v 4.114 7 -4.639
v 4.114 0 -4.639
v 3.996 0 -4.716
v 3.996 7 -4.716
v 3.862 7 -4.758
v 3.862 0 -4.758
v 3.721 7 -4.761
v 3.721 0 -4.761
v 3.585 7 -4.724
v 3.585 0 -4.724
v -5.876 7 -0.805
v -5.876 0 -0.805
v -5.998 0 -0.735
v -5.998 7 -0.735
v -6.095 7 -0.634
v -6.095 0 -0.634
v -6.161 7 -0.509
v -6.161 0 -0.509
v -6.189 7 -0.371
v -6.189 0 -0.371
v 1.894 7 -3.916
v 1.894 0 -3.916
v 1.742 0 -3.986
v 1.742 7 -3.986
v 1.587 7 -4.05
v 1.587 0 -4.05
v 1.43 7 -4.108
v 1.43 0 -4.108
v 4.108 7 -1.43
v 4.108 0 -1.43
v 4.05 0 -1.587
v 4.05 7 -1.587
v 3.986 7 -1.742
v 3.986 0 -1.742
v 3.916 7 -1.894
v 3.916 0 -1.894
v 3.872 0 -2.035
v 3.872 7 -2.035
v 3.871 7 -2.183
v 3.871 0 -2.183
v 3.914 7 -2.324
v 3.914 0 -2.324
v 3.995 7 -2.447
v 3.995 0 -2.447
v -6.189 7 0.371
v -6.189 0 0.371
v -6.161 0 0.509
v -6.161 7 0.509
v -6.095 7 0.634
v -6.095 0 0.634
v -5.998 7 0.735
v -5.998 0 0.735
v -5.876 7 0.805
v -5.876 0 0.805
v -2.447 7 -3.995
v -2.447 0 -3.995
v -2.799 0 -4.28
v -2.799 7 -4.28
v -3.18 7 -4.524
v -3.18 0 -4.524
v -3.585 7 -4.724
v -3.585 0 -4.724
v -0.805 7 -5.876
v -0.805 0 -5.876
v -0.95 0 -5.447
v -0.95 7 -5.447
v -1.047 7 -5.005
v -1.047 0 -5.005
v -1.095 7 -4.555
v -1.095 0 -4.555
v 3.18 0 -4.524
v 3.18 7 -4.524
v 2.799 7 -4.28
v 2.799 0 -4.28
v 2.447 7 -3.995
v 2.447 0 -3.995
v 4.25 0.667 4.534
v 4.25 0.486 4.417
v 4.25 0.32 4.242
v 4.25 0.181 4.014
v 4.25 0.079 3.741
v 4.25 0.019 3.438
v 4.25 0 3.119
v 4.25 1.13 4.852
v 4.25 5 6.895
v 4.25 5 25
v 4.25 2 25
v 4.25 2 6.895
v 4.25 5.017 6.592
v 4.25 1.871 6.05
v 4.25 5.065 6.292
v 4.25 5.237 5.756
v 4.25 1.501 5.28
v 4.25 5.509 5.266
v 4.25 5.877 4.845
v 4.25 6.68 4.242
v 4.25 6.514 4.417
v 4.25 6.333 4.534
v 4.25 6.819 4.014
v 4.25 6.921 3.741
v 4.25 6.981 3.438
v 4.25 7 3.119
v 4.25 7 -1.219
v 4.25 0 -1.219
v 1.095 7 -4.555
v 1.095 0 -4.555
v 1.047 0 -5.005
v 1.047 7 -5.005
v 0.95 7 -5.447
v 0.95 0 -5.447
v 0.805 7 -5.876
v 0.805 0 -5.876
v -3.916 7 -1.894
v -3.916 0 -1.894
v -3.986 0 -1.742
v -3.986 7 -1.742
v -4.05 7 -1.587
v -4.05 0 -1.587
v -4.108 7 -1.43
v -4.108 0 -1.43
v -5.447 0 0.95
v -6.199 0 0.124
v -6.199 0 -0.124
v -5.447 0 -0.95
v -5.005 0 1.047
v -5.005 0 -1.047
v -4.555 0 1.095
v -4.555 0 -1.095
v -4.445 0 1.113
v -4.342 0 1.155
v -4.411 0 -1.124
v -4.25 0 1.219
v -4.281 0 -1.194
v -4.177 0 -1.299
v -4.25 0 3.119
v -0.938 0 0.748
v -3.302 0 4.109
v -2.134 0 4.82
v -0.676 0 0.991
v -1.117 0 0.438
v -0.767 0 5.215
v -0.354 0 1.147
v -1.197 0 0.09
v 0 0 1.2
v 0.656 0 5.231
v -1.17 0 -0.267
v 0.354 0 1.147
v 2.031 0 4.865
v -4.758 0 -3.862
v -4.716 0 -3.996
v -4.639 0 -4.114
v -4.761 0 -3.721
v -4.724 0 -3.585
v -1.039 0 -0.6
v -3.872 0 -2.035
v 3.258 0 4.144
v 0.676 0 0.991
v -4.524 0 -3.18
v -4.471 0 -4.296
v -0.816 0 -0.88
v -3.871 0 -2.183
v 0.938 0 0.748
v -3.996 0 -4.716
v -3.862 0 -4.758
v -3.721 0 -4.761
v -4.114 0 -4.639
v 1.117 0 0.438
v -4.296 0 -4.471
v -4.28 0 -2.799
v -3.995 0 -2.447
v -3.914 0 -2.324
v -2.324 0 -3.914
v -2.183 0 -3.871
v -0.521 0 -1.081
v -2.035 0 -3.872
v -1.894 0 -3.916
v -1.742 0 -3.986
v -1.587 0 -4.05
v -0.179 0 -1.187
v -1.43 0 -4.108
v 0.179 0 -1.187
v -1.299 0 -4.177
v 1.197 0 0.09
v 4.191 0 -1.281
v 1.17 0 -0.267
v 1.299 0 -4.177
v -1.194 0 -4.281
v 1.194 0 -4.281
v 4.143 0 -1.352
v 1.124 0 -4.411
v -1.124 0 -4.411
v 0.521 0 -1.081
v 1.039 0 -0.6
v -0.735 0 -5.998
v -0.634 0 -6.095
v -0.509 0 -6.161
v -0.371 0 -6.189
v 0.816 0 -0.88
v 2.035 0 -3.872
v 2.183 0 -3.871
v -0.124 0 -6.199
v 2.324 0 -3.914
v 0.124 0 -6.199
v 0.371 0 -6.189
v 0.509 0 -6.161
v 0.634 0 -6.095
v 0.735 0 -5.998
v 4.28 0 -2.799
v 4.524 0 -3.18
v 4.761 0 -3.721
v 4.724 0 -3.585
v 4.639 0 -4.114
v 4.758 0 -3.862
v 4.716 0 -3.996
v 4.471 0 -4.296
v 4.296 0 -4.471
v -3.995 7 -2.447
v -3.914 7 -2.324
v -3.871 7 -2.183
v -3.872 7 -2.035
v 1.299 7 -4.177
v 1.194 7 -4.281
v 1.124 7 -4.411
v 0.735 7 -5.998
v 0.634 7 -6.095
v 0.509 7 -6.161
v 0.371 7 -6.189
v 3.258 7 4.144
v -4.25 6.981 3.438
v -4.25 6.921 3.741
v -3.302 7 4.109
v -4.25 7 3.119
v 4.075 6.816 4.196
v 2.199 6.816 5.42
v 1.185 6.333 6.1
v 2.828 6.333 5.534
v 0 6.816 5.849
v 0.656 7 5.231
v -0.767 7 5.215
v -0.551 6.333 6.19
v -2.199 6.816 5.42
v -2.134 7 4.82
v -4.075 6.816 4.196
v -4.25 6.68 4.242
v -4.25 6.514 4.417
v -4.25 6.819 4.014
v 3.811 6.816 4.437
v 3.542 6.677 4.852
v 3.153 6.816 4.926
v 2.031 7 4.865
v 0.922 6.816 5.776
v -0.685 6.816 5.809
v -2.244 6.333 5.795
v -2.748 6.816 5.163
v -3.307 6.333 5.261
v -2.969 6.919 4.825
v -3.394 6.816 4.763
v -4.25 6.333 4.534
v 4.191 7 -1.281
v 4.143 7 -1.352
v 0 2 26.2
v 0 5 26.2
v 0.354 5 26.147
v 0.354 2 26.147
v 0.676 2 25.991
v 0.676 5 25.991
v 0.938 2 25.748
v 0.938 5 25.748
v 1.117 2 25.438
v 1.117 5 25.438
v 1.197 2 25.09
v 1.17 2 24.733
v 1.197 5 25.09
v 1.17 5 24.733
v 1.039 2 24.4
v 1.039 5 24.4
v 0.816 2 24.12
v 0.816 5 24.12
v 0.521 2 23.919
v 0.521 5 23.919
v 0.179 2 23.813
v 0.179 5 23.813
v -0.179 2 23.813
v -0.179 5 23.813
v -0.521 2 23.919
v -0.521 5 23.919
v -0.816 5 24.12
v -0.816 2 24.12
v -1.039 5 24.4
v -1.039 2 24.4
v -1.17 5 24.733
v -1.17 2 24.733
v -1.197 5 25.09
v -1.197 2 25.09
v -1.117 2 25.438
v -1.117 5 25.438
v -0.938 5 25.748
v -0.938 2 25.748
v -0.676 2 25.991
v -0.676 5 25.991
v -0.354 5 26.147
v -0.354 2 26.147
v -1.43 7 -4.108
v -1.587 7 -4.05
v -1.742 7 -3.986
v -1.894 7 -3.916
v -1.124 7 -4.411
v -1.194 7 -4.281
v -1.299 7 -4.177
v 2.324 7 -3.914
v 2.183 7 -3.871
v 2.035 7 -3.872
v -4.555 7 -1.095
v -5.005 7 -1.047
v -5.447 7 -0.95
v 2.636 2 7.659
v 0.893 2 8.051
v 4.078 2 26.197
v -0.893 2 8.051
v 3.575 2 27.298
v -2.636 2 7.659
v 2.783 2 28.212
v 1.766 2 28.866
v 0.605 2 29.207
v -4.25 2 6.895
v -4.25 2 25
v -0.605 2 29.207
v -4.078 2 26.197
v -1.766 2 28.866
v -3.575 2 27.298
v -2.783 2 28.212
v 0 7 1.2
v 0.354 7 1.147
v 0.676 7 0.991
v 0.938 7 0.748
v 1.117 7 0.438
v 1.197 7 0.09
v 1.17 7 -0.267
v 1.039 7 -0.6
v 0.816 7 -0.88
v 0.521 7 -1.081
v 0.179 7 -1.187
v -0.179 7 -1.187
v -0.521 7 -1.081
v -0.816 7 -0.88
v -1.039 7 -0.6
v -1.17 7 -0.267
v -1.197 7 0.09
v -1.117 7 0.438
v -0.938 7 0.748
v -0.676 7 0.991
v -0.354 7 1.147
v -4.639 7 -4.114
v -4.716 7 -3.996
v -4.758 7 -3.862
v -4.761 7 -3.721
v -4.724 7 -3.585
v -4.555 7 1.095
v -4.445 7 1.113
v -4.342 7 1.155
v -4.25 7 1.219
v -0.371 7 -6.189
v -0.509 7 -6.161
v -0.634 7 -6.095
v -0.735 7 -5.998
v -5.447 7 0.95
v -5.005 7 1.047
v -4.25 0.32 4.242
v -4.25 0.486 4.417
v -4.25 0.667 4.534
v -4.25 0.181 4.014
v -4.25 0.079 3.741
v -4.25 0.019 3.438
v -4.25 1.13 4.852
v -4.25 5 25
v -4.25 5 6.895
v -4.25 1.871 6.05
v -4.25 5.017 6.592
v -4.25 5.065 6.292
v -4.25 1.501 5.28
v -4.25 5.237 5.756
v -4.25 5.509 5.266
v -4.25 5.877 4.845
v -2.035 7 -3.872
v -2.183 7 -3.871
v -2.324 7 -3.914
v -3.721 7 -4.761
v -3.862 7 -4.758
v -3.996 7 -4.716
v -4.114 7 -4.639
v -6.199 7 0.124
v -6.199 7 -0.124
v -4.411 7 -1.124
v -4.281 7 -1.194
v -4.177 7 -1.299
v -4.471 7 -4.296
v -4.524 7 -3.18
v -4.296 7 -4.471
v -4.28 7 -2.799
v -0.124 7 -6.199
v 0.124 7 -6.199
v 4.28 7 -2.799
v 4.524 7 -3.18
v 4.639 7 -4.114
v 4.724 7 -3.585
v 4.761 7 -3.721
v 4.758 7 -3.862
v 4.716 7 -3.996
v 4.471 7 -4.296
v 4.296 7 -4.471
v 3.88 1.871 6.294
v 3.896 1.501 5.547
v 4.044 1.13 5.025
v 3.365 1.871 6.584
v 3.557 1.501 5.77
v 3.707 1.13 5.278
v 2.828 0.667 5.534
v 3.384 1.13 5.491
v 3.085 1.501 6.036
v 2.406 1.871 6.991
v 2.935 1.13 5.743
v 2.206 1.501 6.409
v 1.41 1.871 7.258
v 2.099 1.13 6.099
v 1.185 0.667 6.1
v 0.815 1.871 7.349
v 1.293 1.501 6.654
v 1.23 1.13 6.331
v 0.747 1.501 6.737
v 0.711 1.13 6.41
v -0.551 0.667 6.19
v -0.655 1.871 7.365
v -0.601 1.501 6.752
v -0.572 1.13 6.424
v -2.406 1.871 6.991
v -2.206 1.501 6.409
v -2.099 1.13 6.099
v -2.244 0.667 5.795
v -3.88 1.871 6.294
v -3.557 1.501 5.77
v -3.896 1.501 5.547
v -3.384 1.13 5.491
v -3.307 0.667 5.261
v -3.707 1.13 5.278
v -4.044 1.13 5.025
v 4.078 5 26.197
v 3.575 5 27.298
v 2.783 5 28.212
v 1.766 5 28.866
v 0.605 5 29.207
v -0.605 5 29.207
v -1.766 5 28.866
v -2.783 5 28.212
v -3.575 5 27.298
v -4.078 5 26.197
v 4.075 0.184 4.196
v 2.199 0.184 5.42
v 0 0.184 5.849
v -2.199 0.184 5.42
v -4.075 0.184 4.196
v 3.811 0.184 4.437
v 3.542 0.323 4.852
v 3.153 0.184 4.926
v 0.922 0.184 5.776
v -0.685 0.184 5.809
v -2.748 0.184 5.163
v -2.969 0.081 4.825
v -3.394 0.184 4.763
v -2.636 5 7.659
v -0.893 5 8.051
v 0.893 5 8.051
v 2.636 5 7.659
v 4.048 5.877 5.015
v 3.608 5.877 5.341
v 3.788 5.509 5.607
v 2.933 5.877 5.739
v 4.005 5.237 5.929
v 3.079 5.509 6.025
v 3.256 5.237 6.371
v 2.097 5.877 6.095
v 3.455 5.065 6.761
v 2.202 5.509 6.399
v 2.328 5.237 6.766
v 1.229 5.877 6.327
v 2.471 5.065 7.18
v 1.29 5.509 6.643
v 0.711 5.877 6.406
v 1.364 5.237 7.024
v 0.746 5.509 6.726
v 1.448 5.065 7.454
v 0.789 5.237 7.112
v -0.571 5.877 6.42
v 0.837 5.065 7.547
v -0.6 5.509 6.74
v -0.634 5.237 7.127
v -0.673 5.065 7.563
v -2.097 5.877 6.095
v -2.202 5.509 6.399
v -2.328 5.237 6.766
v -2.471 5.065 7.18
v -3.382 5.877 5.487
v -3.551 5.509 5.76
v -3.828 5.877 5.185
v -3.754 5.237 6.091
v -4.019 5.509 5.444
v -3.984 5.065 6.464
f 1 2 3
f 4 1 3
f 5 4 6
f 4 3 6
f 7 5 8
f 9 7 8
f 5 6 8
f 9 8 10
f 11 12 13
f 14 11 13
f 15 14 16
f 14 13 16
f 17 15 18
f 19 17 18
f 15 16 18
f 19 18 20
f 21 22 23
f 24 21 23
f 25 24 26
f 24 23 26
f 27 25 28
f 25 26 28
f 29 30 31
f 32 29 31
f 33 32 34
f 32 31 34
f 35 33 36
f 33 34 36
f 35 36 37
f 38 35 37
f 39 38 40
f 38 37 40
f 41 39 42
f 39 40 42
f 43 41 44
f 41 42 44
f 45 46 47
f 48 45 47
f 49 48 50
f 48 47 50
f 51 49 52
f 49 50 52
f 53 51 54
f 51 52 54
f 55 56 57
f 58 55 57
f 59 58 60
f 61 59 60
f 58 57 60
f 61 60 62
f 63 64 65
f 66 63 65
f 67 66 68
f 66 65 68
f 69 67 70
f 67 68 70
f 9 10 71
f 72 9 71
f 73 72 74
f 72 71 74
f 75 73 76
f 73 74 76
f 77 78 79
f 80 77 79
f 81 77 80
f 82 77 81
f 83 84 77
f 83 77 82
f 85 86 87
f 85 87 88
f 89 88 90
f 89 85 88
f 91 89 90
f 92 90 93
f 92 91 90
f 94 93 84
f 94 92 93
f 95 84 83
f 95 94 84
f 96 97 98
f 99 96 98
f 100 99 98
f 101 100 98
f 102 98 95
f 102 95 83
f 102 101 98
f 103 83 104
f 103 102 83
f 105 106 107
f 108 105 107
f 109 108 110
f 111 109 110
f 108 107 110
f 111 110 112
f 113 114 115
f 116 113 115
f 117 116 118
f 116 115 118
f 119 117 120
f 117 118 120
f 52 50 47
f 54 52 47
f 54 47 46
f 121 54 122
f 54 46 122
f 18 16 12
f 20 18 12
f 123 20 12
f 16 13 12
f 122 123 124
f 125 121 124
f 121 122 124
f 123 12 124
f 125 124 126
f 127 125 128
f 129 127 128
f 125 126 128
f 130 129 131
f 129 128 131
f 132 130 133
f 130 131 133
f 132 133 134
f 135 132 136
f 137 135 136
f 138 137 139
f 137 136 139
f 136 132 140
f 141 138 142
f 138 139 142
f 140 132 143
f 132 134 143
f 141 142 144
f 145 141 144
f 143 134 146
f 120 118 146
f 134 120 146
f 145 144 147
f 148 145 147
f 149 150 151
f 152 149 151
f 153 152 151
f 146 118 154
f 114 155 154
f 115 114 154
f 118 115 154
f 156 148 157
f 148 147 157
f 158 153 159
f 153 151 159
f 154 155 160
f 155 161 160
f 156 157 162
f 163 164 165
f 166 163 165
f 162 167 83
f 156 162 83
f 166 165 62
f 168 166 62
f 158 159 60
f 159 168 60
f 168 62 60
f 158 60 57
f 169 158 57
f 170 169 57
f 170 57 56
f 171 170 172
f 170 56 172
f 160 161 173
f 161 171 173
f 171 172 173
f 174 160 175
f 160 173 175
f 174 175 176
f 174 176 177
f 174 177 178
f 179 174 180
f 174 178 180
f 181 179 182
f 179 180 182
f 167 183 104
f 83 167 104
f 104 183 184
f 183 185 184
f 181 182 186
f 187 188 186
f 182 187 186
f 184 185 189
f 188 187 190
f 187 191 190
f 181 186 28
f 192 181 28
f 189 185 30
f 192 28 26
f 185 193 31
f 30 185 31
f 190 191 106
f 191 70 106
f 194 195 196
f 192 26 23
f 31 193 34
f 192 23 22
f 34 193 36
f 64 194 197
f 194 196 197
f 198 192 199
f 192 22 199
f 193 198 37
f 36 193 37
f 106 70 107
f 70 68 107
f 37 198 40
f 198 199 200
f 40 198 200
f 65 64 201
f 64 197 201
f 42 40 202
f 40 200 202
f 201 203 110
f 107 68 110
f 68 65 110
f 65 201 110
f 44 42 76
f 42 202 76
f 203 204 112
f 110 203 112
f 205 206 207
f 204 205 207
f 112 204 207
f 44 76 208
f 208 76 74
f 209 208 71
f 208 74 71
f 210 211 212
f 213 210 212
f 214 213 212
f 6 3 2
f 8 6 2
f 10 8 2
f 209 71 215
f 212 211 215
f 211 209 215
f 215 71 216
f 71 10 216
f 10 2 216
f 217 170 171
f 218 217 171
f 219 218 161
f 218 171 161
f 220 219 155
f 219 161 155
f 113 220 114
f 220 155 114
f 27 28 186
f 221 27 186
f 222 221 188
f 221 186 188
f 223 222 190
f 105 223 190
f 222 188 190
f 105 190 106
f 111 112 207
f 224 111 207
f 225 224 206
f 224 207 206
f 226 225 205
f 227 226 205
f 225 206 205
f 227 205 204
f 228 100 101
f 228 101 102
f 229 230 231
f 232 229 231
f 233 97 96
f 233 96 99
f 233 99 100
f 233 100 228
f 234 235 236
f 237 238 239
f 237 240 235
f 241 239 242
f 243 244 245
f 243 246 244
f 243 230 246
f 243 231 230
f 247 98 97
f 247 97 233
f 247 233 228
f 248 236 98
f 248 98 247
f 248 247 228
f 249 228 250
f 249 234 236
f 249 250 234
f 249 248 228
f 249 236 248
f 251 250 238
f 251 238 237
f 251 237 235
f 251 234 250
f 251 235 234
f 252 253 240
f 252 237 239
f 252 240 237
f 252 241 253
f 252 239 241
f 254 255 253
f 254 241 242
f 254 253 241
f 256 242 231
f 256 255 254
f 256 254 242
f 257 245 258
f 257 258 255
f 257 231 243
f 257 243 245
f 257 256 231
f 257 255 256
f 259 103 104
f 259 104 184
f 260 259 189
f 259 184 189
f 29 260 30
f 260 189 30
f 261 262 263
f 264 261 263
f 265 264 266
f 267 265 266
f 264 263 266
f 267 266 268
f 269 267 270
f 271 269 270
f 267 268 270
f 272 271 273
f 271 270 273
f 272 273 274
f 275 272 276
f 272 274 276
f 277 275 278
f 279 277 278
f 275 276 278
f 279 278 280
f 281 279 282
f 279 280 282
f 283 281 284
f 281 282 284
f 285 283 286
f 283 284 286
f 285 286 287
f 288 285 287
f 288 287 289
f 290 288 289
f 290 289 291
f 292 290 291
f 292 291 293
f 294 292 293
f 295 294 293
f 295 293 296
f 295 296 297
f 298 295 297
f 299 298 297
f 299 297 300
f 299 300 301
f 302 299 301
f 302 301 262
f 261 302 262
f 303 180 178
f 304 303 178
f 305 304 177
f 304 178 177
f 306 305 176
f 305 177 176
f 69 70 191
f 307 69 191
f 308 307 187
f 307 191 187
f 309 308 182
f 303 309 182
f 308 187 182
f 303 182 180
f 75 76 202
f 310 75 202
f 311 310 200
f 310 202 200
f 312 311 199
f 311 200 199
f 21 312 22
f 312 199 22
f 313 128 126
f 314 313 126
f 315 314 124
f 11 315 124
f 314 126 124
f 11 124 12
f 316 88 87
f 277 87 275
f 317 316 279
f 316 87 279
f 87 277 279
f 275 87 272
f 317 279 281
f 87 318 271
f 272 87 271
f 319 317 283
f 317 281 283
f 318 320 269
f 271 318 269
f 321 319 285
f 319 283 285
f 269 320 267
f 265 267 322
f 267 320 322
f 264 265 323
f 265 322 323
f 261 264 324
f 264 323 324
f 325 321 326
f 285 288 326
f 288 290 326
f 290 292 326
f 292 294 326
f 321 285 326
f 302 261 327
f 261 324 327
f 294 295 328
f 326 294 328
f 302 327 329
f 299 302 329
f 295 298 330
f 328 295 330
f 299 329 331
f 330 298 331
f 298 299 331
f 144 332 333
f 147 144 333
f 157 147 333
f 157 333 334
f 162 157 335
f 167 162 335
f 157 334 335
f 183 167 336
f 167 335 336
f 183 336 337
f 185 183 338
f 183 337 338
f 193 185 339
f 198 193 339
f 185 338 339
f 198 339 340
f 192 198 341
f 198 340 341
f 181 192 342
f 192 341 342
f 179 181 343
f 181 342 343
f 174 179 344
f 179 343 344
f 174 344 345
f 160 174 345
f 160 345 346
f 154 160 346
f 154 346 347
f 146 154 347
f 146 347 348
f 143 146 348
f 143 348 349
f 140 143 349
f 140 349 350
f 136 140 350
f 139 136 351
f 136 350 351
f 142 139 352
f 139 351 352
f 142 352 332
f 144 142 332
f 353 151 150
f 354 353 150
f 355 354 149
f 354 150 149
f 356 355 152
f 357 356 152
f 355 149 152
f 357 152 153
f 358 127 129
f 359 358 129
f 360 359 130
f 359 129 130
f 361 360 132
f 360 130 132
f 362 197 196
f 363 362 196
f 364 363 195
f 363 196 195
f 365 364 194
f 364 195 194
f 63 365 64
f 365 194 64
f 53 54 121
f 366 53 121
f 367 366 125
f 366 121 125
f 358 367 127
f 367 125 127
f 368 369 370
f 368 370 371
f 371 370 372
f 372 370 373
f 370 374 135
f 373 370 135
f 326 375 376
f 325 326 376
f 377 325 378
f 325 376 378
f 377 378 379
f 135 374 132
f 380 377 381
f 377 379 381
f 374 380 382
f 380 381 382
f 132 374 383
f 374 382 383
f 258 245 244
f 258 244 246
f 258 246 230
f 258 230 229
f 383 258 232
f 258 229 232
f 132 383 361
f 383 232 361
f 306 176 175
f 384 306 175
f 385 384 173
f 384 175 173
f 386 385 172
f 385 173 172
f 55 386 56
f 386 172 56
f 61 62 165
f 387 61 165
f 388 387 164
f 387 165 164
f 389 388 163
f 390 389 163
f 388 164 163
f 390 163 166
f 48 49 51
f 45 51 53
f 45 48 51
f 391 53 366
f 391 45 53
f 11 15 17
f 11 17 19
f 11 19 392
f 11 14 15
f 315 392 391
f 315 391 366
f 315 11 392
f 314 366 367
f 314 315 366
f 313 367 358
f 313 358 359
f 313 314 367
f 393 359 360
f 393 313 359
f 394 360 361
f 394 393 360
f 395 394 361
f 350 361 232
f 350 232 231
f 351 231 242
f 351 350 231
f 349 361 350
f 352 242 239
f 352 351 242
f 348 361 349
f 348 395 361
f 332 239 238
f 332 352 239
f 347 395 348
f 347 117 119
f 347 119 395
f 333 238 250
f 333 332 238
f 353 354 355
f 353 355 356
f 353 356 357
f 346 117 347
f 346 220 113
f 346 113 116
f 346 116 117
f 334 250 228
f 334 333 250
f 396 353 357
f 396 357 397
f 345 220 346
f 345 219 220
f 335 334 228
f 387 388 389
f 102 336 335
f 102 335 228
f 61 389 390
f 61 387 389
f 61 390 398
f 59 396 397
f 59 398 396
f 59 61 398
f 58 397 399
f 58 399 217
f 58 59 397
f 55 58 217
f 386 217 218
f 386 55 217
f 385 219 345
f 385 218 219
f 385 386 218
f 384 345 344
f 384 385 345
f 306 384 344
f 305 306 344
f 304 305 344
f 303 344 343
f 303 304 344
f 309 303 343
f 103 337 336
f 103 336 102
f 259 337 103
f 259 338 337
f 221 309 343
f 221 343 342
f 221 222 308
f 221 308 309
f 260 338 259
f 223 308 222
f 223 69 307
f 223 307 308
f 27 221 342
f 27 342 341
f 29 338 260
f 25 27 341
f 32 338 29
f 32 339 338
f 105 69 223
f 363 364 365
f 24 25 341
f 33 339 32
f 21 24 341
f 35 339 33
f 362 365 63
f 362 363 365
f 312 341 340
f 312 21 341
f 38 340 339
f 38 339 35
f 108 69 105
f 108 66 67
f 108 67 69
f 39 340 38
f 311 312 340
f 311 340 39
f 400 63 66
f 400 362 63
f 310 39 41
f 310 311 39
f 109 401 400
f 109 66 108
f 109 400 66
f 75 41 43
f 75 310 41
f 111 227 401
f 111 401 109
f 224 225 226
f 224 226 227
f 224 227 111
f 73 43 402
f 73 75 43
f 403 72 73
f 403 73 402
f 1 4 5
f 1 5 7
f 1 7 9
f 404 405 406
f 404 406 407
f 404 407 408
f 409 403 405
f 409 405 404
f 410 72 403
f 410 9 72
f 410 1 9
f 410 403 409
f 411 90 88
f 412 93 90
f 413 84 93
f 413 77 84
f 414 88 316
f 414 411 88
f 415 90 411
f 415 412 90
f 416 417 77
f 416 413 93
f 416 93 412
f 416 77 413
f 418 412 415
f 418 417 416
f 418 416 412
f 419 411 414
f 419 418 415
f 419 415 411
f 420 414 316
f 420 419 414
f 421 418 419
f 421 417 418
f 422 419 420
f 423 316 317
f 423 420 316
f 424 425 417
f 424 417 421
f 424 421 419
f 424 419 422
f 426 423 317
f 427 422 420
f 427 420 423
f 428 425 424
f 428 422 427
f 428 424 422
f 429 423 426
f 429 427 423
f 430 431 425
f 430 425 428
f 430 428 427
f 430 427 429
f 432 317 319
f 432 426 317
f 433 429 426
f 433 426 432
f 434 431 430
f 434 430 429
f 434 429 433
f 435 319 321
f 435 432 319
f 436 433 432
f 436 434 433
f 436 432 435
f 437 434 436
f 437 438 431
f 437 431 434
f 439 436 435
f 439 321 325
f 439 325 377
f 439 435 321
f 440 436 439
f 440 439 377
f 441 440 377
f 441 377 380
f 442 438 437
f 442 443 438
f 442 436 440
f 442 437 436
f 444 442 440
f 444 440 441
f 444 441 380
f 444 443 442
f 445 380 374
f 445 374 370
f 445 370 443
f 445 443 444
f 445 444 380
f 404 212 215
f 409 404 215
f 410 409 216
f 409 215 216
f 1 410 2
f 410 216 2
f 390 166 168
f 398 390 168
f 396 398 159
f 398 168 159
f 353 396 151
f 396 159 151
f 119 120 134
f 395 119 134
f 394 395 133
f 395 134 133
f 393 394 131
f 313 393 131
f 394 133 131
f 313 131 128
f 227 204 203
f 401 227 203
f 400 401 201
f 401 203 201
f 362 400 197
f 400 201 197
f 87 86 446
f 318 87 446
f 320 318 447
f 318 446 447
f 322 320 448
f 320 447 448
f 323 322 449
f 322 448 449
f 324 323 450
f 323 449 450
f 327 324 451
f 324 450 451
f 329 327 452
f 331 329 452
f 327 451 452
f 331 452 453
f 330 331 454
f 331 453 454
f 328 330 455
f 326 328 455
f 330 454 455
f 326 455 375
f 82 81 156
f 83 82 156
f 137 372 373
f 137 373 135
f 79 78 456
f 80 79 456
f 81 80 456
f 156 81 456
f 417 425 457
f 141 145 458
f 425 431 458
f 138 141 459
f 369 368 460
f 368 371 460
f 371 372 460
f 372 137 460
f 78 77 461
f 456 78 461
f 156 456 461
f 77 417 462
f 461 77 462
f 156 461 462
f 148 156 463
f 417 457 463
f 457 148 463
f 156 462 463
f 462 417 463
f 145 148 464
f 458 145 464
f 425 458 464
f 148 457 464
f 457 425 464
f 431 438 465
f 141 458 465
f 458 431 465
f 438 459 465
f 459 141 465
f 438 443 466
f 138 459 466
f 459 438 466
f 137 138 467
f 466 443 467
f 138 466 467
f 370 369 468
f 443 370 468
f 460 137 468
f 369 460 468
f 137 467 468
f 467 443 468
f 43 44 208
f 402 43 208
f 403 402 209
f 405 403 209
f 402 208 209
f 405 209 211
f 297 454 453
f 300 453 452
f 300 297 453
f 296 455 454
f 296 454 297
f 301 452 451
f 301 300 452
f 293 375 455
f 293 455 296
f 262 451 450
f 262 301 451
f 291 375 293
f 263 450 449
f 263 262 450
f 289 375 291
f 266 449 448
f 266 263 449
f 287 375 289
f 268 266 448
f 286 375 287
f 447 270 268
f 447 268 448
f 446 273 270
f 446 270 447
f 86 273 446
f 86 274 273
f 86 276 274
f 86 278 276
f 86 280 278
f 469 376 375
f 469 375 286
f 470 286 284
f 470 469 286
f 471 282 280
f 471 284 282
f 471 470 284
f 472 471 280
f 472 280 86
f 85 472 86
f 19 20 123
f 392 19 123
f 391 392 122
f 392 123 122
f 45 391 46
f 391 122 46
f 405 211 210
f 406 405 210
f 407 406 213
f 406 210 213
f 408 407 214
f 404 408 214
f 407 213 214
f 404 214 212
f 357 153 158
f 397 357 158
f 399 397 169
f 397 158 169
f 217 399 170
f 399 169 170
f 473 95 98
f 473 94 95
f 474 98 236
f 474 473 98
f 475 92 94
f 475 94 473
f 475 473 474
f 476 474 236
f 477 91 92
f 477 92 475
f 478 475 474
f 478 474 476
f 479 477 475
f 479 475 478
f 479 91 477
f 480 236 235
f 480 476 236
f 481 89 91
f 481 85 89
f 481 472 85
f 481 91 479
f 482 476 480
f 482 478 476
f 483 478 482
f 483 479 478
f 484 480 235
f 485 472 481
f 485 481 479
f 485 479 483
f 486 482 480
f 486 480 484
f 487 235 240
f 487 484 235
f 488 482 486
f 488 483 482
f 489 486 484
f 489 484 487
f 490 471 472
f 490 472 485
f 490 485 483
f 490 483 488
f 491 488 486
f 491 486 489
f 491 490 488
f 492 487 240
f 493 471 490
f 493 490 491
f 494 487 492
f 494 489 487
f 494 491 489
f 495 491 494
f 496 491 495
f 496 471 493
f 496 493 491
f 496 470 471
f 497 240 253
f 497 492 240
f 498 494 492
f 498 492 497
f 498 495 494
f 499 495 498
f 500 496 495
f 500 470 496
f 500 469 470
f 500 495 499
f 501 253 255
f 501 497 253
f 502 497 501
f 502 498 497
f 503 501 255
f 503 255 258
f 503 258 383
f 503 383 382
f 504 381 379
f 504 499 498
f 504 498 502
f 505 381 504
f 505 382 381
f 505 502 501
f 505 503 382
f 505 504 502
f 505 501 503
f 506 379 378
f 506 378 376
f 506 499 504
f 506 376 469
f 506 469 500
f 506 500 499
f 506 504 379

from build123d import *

# Parameters (mm, degrees)
BOSS_EXTRUDE1_DEPTH = 7
BOSS_EXTRUDE2_DEPTH = 7
SKETCH3_R           = 1.2
SKETCH3_W           = 3
SKETCH3_H           = 6
SKETCH3_W_2         = 1
SKETCH3_H_2         = 1.756233336
CUT_EXTRUDE1_DEPTH  = 7
CUT_EXTRUDE2_DEPTH  = 2
CUT_EXTRUDE3_START  = -2
CUT_EXTRUDE3_DEPTH  = 2
FILLET1_R           = 2
FILLET2_R           = 1


with BuildPart() as part:
    # Sketch1 → Boss-Extrude1 (new body)
    with BuildSketch(Plane(origin=(0, 0, 0), x_dir=(1, 0, 0), z_dir=(0, 1, 0))):
        with BuildLine():
            ThreePointArc((-3.91606346, 1.893923699), (-4.018875966, 1.664672931), (-4.108281319, 1.429868737))
            ThreePointArc((-4.108281319, 1.429868737), (-4.280699455, 1.194070126), (-4.55544348, 1.094849567))
            ThreePointArc((-4.55544348, 1.094849567), (-5.227650928, 1.004963027), (-5.875844758, 0.805495733))
            ThreePointArc((-5.875844758, 0.805495733), (-6.095335918, 0.633837197), (-6.188868421, 0.371359211))
            ThreePointArc((-6.188868421, 0.371359211), (-6.2, 0), (-6.188868421, -0.371359211))
            ThreePointArc((-6.188868421, -0.371359211), (-6.095335918, -0.633837197), (-5.875844758, -0.805495733))
            ThreePointArc((-5.875844758, -0.805495733), (-5.227650928, -1.004963027), (-4.55544348, -1.094849567))
            ThreePointArc((-4.55544348, -1.094849567), (-4.280699455, -1.194070126), (-4.108281319, -1.429868737))
            ThreePointArc((-4.108281319, -1.429868737), (-4.018875966, -1.664672931), (-3.91606346, -1.893923699))
            ThreePointArc((-3.91606346, -1.893923699), (-3.871246696, -2.182576529), (-3.995360529, -2.447009422))
            ThreePointArc((-3.995360529, -2.447009422), (-4.407123592, -2.985891249), (-4.724421169, -3.585278179))
            ThreePointArc((-4.724421169, -3.585278179), (-4.758243941, -3.861862781), (-4.638781445, -4.113600212))
            ThreePointArc((-4.638781445, -4.113600212), (-4.274116248, -4.491317212), (-3.87880163, -4.836827257))
            ThreePointArc((-3.87880163, -4.836827257), (-3.119853719, -4.489348414), (-2.447009422, -3.995360529))
            ThreePointArc((-2.447009422, -3.995360529), (-2.182576529, -3.871246696), (-1.893923699, -3.91606346))
            ThreePointArc((-1.893923699, -3.91606346), (-1.664672931, -4.018875966), (-1.429868737, -4.108281319))
            ThreePointArc((-1.429868737, -4.108281319), (-1.194070126, -4.280699455), (-1.094849567, -4.55544348))
            ThreePointArc((-1.094849567, -4.55544348), (-1.004963027, -5.227650928), (-0.805495733, -5.875844758))
            ThreePointArc((-0.805495733, -5.875844758), (-0.633837197, -6.095335918), (-0.371359211, -6.188868421))
            ThreePointArc((-0.371359211, -6.188868421), (0, -6.2), (0.371359211, -6.188868421))
            ThreePointArc((0.371359211, -6.188868421), (0.633837197, -6.095335918), (0.805495733, -5.875844758))
            ThreePointArc((0.805495733, -5.875844758), (1.004963027, -5.227650928), (1.094849567, -4.55544348))
            ThreePointArc((1.094849567, -4.55544348), (1.194070126, -4.280699455), (1.429868737, -4.108281319))
            ThreePointArc((1.429868737, -4.108281319), (1.664672931, -4.018875966), (1.893923699, -3.91606346))
            ThreePointArc((1.893923699, -3.91606346), (2.182576529, -3.871246696), (2.447009422, -3.995360529))
            ThreePointArc((2.447009422, -3.995360529), (2.985891249, -4.407123592), (3.585278179, -4.724421169))
            ThreePointArc((3.585278179, -4.724421169), (3.861862781, -4.758243941), (4.113600212, -4.638781445))
            ThreePointArc((4.113600212, -4.638781445), (4.384062043, -4.384062043), (4.638781445, -4.113600212))
            ThreePointArc((4.638781445, -4.113600212), (4.758243941, -3.861862781), (4.724421169, -3.585278179))
            ThreePointArc((4.724421169, -3.585278179), (4.407123592, -2.985891249), (3.995360529, -2.447009422))
            ThreePointArc((3.995360529, -2.447009422), (3.871246696, -2.182576529), (3.91606346, -1.893923699))
            ThreePointArc((3.91606346, -1.893923699), (4.018875966, -1.664672931), (4.108281319, -1.429868737))
            ThreePointArc((4.108281319, -1.429868737), (4.280699455, -1.194070126), (4.55544348, -1.094849567))
            ThreePointArc((4.55544348, -1.094849567), (5.227650928, -1.004963027), (5.875844758, -0.805495733))
            ThreePointArc((5.875844758, -0.805495733), (6.095335918, -0.633837197), (6.188868421, -0.371359211))
            ThreePointArc((6.188868421, -0.371359211), (6.2, 0), (6.188868421, 0.371359211))
            ThreePointArc((6.188868421, 0.371359211), (6.095335918, 0.633837197), (5.875844758, 0.805495733))
            ThreePointArc((5.875844758, 0.805495733), (5.227650928, 1.004963027), (4.55544348, 1.094849567))
            ThreePointArc((4.55544348, 1.094849567), (4.280699455, 1.194070126), (4.108281319, 1.429868737))
            ThreePointArc((4.108281319, 1.429868737), (4.018875966, 1.664672931), (3.91606346, 1.893923699))
            ThreePointArc((3.91606346, 1.893923699), (3.871246696, 2.182576529), (3.995360529, 2.447009422))
            ThreePointArc((3.995360529, 2.447009422), (4.407123592, 2.985891249), (4.724421169, 3.585278179))
            ThreePointArc((4.724421169, 3.585278179), (4.758243941, 3.861862781), (4.638781445, 4.113600212))
            ThreePointArc((4.638781445, 4.113600212), (4.384062043, 4.384062043), (4.113600212, 4.638781445))
            ThreePointArc((4.113600212, 4.638781445), (3.861862781, 4.758243941), (3.585278179, 4.724421169))
            ThreePointArc((3.585278179, 4.724421169), (2.985891249, 4.407123592), (2.447009422, 3.995360529))
            ThreePointArc((2.447009422, 3.995360529), (2.182576529, 3.871246696), (1.893923699, 3.91606346))
            ThreePointArc((1.893923699, 3.91606346), (1.664672931, 4.018875966), (1.429868737, 4.108281319))
            ThreePointArc((1.429868737, 4.108281319), (1.194070126, 4.280699455), (1.094849567, 4.55544348))
            ThreePointArc((1.094849567, 4.55544348), (1.004963027, 5.227650928), (0.805495733, 5.875844758))
            ThreePointArc((0.805495733, 5.875844758), (0.633837197, 6.095335918), (0.371359211, 6.188868421))
            ThreePointArc((0.371359211, 6.188868421), (0, 6.2), (-0.371359211, 6.188868421))
            ThreePointArc((-0.371359211, 6.188868421), (-0.633837197, 6.095335918), (-0.805495733, 5.875844758))
            ThreePointArc((-0.805495733, 5.875844758), (-1.004963027, 5.227650928), (-1.094849567, 4.55544348))
            ThreePointArc((-1.094849567, 4.55544348), (-1.194070126, 4.280699455), (-1.429868737, 4.108281319))
            ThreePointArc((-1.429868737, 4.108281319), (-1.664672931, 4.018875966), (-1.893923699, 3.91606346))
            ThreePointArc((-1.893923699, 3.91606346), (-2.182576529, 3.871246696), (-2.447009422, 3.995360529))
            ThreePointArc((-2.447009422, 3.995360529), (-2.985891249, 4.407123592), (-3.585278179, 4.724421169))
            ThreePointArc((-3.585278179, 4.724421169), (-3.861862781, 4.758243941), (-4.113600212, 4.638781445))
            ThreePointArc((-4.113600212, 4.638781445), (-4.384062043, 4.384062043), (-4.638781445, 4.113600212))
            ThreePointArc((-4.638781445, 4.113600212), (-4.758243941, 3.861862781), (-4.724421169, 3.585278179))
            ThreePointArc((-4.724421169, 3.585278179), (-4.407123592, 2.985891249), (-3.995360529, 2.447009422))
            ThreePointArc((-3.995360529, 2.447009422), (-3.871246696, 2.182576529), (-3.91606346, 1.893923699))
        make_face()
    extrude(amount=BOSS_EXTRUDE1_DEPTH)

    # Sketch2 → Boss-Extrude2 (add)
    with BuildSketch(Plane(origin=(0, 7, 0), x_dir=(1, 0, 0), z_dir=(0, 1, 0))):
        with BuildLine():
            Line((4.25, 0), (4.25, -25))
            ThreePointArc((4.25, -25), (0, -29.25), (-4.25, -25))
            Line((-4.25, -25), (-4.25, 0))
            ThreePointArc((-4.25, 0), (0, 4.25), (4.25, 0))
        make_face()
    extrude(amount=-BOSS_EXTRUDE2_DEPTH)

    # Sketch3 → Cut-Extrude1 (cut)
    with BuildSketch(Plane(origin=(0, 7, 0), x_dir=(1, 0, 0), z_dir=(0, 1, 0))):
        with Locations(Location((0, 0, 0), (0, 0, 270))):
            Circle(SKETCH3_R)
        with Locations(Location((0, -25, 0), (0, 0, 270))):
            Circle(SKETCH3_R)
        with Locations((5.75, -1.514144437)):
            Rectangle(SKETCH3_W, SKETCH3_H)
        with Locations((-4.75, -3.636027769)):
            Rectangle(SKETCH3_W_2, SKETCH3_H_2)
    extrude(amount=-CUT_EXTRUDE1_DEPTH, mode=Mode.SUBTRACT)

    # Sketch5 → Cut-Extrude2 (cut)
    with BuildSketch(Plane.XZ):
        with BuildLine():
            Line((-4.25, 4.375785644), (-4.25, 29.25))
            Line((-4.25, 29.25), (4.25, 29.25))
            Line((4.25, 29.25), (4.25, 4.375785644))
            ThreePointArc((4.25, 4.375785644), (0, 6.1), (-4.25, 4.375785644))
        make_face()
    extrude(amount=-CUT_EXTRUDE2_DEPTH, mode=Mode.SUBTRACT)

    # Sketch6 → Cut-Extrude3 (cut)
    with BuildSketch(Plane(origin=(0, 7, 0), x_dir=(1, 0, 0), z_dir=(0, 1, 0)).offset(CUT_EXTRUDE3_START)):
        with BuildLine():
            Line((-4.25, -4.375785644), (-4.25, -29.25))
            Line((-4.25, -29.25), (4.25, -29.25))
            Line((4.25, -29.25), (4.25, -4.375785644))
            ThreePointArc((4.25, -4.375785644), (0, -6.1), (-4.25, -4.375785644))
        make_face()
    extrude(amount=CUT_EXTRUDE3_DEPTH, mode=Mode.SUBTRACT)

    # Fillet1
    fillet1_edges = [part.edges().sort_by_distance(p)[0] for p in [
        (0, 2, 6.1),
        (0, 5, 6.1),
    ]]
    fillet(fillet1_edges, radius=FILLET1_R - 0.0001)  # a hair under: the kernel refuses the full size

    # Fillet2
    fillet2_edges = [part.edges().sort_by_distance(p)[0] for p in [
        (0, 7, 6.1),
        (0, 0, 6.1),
    ]]
    fillet(fillet2_edges, radius=FILLET2_R)


solid = part.part
